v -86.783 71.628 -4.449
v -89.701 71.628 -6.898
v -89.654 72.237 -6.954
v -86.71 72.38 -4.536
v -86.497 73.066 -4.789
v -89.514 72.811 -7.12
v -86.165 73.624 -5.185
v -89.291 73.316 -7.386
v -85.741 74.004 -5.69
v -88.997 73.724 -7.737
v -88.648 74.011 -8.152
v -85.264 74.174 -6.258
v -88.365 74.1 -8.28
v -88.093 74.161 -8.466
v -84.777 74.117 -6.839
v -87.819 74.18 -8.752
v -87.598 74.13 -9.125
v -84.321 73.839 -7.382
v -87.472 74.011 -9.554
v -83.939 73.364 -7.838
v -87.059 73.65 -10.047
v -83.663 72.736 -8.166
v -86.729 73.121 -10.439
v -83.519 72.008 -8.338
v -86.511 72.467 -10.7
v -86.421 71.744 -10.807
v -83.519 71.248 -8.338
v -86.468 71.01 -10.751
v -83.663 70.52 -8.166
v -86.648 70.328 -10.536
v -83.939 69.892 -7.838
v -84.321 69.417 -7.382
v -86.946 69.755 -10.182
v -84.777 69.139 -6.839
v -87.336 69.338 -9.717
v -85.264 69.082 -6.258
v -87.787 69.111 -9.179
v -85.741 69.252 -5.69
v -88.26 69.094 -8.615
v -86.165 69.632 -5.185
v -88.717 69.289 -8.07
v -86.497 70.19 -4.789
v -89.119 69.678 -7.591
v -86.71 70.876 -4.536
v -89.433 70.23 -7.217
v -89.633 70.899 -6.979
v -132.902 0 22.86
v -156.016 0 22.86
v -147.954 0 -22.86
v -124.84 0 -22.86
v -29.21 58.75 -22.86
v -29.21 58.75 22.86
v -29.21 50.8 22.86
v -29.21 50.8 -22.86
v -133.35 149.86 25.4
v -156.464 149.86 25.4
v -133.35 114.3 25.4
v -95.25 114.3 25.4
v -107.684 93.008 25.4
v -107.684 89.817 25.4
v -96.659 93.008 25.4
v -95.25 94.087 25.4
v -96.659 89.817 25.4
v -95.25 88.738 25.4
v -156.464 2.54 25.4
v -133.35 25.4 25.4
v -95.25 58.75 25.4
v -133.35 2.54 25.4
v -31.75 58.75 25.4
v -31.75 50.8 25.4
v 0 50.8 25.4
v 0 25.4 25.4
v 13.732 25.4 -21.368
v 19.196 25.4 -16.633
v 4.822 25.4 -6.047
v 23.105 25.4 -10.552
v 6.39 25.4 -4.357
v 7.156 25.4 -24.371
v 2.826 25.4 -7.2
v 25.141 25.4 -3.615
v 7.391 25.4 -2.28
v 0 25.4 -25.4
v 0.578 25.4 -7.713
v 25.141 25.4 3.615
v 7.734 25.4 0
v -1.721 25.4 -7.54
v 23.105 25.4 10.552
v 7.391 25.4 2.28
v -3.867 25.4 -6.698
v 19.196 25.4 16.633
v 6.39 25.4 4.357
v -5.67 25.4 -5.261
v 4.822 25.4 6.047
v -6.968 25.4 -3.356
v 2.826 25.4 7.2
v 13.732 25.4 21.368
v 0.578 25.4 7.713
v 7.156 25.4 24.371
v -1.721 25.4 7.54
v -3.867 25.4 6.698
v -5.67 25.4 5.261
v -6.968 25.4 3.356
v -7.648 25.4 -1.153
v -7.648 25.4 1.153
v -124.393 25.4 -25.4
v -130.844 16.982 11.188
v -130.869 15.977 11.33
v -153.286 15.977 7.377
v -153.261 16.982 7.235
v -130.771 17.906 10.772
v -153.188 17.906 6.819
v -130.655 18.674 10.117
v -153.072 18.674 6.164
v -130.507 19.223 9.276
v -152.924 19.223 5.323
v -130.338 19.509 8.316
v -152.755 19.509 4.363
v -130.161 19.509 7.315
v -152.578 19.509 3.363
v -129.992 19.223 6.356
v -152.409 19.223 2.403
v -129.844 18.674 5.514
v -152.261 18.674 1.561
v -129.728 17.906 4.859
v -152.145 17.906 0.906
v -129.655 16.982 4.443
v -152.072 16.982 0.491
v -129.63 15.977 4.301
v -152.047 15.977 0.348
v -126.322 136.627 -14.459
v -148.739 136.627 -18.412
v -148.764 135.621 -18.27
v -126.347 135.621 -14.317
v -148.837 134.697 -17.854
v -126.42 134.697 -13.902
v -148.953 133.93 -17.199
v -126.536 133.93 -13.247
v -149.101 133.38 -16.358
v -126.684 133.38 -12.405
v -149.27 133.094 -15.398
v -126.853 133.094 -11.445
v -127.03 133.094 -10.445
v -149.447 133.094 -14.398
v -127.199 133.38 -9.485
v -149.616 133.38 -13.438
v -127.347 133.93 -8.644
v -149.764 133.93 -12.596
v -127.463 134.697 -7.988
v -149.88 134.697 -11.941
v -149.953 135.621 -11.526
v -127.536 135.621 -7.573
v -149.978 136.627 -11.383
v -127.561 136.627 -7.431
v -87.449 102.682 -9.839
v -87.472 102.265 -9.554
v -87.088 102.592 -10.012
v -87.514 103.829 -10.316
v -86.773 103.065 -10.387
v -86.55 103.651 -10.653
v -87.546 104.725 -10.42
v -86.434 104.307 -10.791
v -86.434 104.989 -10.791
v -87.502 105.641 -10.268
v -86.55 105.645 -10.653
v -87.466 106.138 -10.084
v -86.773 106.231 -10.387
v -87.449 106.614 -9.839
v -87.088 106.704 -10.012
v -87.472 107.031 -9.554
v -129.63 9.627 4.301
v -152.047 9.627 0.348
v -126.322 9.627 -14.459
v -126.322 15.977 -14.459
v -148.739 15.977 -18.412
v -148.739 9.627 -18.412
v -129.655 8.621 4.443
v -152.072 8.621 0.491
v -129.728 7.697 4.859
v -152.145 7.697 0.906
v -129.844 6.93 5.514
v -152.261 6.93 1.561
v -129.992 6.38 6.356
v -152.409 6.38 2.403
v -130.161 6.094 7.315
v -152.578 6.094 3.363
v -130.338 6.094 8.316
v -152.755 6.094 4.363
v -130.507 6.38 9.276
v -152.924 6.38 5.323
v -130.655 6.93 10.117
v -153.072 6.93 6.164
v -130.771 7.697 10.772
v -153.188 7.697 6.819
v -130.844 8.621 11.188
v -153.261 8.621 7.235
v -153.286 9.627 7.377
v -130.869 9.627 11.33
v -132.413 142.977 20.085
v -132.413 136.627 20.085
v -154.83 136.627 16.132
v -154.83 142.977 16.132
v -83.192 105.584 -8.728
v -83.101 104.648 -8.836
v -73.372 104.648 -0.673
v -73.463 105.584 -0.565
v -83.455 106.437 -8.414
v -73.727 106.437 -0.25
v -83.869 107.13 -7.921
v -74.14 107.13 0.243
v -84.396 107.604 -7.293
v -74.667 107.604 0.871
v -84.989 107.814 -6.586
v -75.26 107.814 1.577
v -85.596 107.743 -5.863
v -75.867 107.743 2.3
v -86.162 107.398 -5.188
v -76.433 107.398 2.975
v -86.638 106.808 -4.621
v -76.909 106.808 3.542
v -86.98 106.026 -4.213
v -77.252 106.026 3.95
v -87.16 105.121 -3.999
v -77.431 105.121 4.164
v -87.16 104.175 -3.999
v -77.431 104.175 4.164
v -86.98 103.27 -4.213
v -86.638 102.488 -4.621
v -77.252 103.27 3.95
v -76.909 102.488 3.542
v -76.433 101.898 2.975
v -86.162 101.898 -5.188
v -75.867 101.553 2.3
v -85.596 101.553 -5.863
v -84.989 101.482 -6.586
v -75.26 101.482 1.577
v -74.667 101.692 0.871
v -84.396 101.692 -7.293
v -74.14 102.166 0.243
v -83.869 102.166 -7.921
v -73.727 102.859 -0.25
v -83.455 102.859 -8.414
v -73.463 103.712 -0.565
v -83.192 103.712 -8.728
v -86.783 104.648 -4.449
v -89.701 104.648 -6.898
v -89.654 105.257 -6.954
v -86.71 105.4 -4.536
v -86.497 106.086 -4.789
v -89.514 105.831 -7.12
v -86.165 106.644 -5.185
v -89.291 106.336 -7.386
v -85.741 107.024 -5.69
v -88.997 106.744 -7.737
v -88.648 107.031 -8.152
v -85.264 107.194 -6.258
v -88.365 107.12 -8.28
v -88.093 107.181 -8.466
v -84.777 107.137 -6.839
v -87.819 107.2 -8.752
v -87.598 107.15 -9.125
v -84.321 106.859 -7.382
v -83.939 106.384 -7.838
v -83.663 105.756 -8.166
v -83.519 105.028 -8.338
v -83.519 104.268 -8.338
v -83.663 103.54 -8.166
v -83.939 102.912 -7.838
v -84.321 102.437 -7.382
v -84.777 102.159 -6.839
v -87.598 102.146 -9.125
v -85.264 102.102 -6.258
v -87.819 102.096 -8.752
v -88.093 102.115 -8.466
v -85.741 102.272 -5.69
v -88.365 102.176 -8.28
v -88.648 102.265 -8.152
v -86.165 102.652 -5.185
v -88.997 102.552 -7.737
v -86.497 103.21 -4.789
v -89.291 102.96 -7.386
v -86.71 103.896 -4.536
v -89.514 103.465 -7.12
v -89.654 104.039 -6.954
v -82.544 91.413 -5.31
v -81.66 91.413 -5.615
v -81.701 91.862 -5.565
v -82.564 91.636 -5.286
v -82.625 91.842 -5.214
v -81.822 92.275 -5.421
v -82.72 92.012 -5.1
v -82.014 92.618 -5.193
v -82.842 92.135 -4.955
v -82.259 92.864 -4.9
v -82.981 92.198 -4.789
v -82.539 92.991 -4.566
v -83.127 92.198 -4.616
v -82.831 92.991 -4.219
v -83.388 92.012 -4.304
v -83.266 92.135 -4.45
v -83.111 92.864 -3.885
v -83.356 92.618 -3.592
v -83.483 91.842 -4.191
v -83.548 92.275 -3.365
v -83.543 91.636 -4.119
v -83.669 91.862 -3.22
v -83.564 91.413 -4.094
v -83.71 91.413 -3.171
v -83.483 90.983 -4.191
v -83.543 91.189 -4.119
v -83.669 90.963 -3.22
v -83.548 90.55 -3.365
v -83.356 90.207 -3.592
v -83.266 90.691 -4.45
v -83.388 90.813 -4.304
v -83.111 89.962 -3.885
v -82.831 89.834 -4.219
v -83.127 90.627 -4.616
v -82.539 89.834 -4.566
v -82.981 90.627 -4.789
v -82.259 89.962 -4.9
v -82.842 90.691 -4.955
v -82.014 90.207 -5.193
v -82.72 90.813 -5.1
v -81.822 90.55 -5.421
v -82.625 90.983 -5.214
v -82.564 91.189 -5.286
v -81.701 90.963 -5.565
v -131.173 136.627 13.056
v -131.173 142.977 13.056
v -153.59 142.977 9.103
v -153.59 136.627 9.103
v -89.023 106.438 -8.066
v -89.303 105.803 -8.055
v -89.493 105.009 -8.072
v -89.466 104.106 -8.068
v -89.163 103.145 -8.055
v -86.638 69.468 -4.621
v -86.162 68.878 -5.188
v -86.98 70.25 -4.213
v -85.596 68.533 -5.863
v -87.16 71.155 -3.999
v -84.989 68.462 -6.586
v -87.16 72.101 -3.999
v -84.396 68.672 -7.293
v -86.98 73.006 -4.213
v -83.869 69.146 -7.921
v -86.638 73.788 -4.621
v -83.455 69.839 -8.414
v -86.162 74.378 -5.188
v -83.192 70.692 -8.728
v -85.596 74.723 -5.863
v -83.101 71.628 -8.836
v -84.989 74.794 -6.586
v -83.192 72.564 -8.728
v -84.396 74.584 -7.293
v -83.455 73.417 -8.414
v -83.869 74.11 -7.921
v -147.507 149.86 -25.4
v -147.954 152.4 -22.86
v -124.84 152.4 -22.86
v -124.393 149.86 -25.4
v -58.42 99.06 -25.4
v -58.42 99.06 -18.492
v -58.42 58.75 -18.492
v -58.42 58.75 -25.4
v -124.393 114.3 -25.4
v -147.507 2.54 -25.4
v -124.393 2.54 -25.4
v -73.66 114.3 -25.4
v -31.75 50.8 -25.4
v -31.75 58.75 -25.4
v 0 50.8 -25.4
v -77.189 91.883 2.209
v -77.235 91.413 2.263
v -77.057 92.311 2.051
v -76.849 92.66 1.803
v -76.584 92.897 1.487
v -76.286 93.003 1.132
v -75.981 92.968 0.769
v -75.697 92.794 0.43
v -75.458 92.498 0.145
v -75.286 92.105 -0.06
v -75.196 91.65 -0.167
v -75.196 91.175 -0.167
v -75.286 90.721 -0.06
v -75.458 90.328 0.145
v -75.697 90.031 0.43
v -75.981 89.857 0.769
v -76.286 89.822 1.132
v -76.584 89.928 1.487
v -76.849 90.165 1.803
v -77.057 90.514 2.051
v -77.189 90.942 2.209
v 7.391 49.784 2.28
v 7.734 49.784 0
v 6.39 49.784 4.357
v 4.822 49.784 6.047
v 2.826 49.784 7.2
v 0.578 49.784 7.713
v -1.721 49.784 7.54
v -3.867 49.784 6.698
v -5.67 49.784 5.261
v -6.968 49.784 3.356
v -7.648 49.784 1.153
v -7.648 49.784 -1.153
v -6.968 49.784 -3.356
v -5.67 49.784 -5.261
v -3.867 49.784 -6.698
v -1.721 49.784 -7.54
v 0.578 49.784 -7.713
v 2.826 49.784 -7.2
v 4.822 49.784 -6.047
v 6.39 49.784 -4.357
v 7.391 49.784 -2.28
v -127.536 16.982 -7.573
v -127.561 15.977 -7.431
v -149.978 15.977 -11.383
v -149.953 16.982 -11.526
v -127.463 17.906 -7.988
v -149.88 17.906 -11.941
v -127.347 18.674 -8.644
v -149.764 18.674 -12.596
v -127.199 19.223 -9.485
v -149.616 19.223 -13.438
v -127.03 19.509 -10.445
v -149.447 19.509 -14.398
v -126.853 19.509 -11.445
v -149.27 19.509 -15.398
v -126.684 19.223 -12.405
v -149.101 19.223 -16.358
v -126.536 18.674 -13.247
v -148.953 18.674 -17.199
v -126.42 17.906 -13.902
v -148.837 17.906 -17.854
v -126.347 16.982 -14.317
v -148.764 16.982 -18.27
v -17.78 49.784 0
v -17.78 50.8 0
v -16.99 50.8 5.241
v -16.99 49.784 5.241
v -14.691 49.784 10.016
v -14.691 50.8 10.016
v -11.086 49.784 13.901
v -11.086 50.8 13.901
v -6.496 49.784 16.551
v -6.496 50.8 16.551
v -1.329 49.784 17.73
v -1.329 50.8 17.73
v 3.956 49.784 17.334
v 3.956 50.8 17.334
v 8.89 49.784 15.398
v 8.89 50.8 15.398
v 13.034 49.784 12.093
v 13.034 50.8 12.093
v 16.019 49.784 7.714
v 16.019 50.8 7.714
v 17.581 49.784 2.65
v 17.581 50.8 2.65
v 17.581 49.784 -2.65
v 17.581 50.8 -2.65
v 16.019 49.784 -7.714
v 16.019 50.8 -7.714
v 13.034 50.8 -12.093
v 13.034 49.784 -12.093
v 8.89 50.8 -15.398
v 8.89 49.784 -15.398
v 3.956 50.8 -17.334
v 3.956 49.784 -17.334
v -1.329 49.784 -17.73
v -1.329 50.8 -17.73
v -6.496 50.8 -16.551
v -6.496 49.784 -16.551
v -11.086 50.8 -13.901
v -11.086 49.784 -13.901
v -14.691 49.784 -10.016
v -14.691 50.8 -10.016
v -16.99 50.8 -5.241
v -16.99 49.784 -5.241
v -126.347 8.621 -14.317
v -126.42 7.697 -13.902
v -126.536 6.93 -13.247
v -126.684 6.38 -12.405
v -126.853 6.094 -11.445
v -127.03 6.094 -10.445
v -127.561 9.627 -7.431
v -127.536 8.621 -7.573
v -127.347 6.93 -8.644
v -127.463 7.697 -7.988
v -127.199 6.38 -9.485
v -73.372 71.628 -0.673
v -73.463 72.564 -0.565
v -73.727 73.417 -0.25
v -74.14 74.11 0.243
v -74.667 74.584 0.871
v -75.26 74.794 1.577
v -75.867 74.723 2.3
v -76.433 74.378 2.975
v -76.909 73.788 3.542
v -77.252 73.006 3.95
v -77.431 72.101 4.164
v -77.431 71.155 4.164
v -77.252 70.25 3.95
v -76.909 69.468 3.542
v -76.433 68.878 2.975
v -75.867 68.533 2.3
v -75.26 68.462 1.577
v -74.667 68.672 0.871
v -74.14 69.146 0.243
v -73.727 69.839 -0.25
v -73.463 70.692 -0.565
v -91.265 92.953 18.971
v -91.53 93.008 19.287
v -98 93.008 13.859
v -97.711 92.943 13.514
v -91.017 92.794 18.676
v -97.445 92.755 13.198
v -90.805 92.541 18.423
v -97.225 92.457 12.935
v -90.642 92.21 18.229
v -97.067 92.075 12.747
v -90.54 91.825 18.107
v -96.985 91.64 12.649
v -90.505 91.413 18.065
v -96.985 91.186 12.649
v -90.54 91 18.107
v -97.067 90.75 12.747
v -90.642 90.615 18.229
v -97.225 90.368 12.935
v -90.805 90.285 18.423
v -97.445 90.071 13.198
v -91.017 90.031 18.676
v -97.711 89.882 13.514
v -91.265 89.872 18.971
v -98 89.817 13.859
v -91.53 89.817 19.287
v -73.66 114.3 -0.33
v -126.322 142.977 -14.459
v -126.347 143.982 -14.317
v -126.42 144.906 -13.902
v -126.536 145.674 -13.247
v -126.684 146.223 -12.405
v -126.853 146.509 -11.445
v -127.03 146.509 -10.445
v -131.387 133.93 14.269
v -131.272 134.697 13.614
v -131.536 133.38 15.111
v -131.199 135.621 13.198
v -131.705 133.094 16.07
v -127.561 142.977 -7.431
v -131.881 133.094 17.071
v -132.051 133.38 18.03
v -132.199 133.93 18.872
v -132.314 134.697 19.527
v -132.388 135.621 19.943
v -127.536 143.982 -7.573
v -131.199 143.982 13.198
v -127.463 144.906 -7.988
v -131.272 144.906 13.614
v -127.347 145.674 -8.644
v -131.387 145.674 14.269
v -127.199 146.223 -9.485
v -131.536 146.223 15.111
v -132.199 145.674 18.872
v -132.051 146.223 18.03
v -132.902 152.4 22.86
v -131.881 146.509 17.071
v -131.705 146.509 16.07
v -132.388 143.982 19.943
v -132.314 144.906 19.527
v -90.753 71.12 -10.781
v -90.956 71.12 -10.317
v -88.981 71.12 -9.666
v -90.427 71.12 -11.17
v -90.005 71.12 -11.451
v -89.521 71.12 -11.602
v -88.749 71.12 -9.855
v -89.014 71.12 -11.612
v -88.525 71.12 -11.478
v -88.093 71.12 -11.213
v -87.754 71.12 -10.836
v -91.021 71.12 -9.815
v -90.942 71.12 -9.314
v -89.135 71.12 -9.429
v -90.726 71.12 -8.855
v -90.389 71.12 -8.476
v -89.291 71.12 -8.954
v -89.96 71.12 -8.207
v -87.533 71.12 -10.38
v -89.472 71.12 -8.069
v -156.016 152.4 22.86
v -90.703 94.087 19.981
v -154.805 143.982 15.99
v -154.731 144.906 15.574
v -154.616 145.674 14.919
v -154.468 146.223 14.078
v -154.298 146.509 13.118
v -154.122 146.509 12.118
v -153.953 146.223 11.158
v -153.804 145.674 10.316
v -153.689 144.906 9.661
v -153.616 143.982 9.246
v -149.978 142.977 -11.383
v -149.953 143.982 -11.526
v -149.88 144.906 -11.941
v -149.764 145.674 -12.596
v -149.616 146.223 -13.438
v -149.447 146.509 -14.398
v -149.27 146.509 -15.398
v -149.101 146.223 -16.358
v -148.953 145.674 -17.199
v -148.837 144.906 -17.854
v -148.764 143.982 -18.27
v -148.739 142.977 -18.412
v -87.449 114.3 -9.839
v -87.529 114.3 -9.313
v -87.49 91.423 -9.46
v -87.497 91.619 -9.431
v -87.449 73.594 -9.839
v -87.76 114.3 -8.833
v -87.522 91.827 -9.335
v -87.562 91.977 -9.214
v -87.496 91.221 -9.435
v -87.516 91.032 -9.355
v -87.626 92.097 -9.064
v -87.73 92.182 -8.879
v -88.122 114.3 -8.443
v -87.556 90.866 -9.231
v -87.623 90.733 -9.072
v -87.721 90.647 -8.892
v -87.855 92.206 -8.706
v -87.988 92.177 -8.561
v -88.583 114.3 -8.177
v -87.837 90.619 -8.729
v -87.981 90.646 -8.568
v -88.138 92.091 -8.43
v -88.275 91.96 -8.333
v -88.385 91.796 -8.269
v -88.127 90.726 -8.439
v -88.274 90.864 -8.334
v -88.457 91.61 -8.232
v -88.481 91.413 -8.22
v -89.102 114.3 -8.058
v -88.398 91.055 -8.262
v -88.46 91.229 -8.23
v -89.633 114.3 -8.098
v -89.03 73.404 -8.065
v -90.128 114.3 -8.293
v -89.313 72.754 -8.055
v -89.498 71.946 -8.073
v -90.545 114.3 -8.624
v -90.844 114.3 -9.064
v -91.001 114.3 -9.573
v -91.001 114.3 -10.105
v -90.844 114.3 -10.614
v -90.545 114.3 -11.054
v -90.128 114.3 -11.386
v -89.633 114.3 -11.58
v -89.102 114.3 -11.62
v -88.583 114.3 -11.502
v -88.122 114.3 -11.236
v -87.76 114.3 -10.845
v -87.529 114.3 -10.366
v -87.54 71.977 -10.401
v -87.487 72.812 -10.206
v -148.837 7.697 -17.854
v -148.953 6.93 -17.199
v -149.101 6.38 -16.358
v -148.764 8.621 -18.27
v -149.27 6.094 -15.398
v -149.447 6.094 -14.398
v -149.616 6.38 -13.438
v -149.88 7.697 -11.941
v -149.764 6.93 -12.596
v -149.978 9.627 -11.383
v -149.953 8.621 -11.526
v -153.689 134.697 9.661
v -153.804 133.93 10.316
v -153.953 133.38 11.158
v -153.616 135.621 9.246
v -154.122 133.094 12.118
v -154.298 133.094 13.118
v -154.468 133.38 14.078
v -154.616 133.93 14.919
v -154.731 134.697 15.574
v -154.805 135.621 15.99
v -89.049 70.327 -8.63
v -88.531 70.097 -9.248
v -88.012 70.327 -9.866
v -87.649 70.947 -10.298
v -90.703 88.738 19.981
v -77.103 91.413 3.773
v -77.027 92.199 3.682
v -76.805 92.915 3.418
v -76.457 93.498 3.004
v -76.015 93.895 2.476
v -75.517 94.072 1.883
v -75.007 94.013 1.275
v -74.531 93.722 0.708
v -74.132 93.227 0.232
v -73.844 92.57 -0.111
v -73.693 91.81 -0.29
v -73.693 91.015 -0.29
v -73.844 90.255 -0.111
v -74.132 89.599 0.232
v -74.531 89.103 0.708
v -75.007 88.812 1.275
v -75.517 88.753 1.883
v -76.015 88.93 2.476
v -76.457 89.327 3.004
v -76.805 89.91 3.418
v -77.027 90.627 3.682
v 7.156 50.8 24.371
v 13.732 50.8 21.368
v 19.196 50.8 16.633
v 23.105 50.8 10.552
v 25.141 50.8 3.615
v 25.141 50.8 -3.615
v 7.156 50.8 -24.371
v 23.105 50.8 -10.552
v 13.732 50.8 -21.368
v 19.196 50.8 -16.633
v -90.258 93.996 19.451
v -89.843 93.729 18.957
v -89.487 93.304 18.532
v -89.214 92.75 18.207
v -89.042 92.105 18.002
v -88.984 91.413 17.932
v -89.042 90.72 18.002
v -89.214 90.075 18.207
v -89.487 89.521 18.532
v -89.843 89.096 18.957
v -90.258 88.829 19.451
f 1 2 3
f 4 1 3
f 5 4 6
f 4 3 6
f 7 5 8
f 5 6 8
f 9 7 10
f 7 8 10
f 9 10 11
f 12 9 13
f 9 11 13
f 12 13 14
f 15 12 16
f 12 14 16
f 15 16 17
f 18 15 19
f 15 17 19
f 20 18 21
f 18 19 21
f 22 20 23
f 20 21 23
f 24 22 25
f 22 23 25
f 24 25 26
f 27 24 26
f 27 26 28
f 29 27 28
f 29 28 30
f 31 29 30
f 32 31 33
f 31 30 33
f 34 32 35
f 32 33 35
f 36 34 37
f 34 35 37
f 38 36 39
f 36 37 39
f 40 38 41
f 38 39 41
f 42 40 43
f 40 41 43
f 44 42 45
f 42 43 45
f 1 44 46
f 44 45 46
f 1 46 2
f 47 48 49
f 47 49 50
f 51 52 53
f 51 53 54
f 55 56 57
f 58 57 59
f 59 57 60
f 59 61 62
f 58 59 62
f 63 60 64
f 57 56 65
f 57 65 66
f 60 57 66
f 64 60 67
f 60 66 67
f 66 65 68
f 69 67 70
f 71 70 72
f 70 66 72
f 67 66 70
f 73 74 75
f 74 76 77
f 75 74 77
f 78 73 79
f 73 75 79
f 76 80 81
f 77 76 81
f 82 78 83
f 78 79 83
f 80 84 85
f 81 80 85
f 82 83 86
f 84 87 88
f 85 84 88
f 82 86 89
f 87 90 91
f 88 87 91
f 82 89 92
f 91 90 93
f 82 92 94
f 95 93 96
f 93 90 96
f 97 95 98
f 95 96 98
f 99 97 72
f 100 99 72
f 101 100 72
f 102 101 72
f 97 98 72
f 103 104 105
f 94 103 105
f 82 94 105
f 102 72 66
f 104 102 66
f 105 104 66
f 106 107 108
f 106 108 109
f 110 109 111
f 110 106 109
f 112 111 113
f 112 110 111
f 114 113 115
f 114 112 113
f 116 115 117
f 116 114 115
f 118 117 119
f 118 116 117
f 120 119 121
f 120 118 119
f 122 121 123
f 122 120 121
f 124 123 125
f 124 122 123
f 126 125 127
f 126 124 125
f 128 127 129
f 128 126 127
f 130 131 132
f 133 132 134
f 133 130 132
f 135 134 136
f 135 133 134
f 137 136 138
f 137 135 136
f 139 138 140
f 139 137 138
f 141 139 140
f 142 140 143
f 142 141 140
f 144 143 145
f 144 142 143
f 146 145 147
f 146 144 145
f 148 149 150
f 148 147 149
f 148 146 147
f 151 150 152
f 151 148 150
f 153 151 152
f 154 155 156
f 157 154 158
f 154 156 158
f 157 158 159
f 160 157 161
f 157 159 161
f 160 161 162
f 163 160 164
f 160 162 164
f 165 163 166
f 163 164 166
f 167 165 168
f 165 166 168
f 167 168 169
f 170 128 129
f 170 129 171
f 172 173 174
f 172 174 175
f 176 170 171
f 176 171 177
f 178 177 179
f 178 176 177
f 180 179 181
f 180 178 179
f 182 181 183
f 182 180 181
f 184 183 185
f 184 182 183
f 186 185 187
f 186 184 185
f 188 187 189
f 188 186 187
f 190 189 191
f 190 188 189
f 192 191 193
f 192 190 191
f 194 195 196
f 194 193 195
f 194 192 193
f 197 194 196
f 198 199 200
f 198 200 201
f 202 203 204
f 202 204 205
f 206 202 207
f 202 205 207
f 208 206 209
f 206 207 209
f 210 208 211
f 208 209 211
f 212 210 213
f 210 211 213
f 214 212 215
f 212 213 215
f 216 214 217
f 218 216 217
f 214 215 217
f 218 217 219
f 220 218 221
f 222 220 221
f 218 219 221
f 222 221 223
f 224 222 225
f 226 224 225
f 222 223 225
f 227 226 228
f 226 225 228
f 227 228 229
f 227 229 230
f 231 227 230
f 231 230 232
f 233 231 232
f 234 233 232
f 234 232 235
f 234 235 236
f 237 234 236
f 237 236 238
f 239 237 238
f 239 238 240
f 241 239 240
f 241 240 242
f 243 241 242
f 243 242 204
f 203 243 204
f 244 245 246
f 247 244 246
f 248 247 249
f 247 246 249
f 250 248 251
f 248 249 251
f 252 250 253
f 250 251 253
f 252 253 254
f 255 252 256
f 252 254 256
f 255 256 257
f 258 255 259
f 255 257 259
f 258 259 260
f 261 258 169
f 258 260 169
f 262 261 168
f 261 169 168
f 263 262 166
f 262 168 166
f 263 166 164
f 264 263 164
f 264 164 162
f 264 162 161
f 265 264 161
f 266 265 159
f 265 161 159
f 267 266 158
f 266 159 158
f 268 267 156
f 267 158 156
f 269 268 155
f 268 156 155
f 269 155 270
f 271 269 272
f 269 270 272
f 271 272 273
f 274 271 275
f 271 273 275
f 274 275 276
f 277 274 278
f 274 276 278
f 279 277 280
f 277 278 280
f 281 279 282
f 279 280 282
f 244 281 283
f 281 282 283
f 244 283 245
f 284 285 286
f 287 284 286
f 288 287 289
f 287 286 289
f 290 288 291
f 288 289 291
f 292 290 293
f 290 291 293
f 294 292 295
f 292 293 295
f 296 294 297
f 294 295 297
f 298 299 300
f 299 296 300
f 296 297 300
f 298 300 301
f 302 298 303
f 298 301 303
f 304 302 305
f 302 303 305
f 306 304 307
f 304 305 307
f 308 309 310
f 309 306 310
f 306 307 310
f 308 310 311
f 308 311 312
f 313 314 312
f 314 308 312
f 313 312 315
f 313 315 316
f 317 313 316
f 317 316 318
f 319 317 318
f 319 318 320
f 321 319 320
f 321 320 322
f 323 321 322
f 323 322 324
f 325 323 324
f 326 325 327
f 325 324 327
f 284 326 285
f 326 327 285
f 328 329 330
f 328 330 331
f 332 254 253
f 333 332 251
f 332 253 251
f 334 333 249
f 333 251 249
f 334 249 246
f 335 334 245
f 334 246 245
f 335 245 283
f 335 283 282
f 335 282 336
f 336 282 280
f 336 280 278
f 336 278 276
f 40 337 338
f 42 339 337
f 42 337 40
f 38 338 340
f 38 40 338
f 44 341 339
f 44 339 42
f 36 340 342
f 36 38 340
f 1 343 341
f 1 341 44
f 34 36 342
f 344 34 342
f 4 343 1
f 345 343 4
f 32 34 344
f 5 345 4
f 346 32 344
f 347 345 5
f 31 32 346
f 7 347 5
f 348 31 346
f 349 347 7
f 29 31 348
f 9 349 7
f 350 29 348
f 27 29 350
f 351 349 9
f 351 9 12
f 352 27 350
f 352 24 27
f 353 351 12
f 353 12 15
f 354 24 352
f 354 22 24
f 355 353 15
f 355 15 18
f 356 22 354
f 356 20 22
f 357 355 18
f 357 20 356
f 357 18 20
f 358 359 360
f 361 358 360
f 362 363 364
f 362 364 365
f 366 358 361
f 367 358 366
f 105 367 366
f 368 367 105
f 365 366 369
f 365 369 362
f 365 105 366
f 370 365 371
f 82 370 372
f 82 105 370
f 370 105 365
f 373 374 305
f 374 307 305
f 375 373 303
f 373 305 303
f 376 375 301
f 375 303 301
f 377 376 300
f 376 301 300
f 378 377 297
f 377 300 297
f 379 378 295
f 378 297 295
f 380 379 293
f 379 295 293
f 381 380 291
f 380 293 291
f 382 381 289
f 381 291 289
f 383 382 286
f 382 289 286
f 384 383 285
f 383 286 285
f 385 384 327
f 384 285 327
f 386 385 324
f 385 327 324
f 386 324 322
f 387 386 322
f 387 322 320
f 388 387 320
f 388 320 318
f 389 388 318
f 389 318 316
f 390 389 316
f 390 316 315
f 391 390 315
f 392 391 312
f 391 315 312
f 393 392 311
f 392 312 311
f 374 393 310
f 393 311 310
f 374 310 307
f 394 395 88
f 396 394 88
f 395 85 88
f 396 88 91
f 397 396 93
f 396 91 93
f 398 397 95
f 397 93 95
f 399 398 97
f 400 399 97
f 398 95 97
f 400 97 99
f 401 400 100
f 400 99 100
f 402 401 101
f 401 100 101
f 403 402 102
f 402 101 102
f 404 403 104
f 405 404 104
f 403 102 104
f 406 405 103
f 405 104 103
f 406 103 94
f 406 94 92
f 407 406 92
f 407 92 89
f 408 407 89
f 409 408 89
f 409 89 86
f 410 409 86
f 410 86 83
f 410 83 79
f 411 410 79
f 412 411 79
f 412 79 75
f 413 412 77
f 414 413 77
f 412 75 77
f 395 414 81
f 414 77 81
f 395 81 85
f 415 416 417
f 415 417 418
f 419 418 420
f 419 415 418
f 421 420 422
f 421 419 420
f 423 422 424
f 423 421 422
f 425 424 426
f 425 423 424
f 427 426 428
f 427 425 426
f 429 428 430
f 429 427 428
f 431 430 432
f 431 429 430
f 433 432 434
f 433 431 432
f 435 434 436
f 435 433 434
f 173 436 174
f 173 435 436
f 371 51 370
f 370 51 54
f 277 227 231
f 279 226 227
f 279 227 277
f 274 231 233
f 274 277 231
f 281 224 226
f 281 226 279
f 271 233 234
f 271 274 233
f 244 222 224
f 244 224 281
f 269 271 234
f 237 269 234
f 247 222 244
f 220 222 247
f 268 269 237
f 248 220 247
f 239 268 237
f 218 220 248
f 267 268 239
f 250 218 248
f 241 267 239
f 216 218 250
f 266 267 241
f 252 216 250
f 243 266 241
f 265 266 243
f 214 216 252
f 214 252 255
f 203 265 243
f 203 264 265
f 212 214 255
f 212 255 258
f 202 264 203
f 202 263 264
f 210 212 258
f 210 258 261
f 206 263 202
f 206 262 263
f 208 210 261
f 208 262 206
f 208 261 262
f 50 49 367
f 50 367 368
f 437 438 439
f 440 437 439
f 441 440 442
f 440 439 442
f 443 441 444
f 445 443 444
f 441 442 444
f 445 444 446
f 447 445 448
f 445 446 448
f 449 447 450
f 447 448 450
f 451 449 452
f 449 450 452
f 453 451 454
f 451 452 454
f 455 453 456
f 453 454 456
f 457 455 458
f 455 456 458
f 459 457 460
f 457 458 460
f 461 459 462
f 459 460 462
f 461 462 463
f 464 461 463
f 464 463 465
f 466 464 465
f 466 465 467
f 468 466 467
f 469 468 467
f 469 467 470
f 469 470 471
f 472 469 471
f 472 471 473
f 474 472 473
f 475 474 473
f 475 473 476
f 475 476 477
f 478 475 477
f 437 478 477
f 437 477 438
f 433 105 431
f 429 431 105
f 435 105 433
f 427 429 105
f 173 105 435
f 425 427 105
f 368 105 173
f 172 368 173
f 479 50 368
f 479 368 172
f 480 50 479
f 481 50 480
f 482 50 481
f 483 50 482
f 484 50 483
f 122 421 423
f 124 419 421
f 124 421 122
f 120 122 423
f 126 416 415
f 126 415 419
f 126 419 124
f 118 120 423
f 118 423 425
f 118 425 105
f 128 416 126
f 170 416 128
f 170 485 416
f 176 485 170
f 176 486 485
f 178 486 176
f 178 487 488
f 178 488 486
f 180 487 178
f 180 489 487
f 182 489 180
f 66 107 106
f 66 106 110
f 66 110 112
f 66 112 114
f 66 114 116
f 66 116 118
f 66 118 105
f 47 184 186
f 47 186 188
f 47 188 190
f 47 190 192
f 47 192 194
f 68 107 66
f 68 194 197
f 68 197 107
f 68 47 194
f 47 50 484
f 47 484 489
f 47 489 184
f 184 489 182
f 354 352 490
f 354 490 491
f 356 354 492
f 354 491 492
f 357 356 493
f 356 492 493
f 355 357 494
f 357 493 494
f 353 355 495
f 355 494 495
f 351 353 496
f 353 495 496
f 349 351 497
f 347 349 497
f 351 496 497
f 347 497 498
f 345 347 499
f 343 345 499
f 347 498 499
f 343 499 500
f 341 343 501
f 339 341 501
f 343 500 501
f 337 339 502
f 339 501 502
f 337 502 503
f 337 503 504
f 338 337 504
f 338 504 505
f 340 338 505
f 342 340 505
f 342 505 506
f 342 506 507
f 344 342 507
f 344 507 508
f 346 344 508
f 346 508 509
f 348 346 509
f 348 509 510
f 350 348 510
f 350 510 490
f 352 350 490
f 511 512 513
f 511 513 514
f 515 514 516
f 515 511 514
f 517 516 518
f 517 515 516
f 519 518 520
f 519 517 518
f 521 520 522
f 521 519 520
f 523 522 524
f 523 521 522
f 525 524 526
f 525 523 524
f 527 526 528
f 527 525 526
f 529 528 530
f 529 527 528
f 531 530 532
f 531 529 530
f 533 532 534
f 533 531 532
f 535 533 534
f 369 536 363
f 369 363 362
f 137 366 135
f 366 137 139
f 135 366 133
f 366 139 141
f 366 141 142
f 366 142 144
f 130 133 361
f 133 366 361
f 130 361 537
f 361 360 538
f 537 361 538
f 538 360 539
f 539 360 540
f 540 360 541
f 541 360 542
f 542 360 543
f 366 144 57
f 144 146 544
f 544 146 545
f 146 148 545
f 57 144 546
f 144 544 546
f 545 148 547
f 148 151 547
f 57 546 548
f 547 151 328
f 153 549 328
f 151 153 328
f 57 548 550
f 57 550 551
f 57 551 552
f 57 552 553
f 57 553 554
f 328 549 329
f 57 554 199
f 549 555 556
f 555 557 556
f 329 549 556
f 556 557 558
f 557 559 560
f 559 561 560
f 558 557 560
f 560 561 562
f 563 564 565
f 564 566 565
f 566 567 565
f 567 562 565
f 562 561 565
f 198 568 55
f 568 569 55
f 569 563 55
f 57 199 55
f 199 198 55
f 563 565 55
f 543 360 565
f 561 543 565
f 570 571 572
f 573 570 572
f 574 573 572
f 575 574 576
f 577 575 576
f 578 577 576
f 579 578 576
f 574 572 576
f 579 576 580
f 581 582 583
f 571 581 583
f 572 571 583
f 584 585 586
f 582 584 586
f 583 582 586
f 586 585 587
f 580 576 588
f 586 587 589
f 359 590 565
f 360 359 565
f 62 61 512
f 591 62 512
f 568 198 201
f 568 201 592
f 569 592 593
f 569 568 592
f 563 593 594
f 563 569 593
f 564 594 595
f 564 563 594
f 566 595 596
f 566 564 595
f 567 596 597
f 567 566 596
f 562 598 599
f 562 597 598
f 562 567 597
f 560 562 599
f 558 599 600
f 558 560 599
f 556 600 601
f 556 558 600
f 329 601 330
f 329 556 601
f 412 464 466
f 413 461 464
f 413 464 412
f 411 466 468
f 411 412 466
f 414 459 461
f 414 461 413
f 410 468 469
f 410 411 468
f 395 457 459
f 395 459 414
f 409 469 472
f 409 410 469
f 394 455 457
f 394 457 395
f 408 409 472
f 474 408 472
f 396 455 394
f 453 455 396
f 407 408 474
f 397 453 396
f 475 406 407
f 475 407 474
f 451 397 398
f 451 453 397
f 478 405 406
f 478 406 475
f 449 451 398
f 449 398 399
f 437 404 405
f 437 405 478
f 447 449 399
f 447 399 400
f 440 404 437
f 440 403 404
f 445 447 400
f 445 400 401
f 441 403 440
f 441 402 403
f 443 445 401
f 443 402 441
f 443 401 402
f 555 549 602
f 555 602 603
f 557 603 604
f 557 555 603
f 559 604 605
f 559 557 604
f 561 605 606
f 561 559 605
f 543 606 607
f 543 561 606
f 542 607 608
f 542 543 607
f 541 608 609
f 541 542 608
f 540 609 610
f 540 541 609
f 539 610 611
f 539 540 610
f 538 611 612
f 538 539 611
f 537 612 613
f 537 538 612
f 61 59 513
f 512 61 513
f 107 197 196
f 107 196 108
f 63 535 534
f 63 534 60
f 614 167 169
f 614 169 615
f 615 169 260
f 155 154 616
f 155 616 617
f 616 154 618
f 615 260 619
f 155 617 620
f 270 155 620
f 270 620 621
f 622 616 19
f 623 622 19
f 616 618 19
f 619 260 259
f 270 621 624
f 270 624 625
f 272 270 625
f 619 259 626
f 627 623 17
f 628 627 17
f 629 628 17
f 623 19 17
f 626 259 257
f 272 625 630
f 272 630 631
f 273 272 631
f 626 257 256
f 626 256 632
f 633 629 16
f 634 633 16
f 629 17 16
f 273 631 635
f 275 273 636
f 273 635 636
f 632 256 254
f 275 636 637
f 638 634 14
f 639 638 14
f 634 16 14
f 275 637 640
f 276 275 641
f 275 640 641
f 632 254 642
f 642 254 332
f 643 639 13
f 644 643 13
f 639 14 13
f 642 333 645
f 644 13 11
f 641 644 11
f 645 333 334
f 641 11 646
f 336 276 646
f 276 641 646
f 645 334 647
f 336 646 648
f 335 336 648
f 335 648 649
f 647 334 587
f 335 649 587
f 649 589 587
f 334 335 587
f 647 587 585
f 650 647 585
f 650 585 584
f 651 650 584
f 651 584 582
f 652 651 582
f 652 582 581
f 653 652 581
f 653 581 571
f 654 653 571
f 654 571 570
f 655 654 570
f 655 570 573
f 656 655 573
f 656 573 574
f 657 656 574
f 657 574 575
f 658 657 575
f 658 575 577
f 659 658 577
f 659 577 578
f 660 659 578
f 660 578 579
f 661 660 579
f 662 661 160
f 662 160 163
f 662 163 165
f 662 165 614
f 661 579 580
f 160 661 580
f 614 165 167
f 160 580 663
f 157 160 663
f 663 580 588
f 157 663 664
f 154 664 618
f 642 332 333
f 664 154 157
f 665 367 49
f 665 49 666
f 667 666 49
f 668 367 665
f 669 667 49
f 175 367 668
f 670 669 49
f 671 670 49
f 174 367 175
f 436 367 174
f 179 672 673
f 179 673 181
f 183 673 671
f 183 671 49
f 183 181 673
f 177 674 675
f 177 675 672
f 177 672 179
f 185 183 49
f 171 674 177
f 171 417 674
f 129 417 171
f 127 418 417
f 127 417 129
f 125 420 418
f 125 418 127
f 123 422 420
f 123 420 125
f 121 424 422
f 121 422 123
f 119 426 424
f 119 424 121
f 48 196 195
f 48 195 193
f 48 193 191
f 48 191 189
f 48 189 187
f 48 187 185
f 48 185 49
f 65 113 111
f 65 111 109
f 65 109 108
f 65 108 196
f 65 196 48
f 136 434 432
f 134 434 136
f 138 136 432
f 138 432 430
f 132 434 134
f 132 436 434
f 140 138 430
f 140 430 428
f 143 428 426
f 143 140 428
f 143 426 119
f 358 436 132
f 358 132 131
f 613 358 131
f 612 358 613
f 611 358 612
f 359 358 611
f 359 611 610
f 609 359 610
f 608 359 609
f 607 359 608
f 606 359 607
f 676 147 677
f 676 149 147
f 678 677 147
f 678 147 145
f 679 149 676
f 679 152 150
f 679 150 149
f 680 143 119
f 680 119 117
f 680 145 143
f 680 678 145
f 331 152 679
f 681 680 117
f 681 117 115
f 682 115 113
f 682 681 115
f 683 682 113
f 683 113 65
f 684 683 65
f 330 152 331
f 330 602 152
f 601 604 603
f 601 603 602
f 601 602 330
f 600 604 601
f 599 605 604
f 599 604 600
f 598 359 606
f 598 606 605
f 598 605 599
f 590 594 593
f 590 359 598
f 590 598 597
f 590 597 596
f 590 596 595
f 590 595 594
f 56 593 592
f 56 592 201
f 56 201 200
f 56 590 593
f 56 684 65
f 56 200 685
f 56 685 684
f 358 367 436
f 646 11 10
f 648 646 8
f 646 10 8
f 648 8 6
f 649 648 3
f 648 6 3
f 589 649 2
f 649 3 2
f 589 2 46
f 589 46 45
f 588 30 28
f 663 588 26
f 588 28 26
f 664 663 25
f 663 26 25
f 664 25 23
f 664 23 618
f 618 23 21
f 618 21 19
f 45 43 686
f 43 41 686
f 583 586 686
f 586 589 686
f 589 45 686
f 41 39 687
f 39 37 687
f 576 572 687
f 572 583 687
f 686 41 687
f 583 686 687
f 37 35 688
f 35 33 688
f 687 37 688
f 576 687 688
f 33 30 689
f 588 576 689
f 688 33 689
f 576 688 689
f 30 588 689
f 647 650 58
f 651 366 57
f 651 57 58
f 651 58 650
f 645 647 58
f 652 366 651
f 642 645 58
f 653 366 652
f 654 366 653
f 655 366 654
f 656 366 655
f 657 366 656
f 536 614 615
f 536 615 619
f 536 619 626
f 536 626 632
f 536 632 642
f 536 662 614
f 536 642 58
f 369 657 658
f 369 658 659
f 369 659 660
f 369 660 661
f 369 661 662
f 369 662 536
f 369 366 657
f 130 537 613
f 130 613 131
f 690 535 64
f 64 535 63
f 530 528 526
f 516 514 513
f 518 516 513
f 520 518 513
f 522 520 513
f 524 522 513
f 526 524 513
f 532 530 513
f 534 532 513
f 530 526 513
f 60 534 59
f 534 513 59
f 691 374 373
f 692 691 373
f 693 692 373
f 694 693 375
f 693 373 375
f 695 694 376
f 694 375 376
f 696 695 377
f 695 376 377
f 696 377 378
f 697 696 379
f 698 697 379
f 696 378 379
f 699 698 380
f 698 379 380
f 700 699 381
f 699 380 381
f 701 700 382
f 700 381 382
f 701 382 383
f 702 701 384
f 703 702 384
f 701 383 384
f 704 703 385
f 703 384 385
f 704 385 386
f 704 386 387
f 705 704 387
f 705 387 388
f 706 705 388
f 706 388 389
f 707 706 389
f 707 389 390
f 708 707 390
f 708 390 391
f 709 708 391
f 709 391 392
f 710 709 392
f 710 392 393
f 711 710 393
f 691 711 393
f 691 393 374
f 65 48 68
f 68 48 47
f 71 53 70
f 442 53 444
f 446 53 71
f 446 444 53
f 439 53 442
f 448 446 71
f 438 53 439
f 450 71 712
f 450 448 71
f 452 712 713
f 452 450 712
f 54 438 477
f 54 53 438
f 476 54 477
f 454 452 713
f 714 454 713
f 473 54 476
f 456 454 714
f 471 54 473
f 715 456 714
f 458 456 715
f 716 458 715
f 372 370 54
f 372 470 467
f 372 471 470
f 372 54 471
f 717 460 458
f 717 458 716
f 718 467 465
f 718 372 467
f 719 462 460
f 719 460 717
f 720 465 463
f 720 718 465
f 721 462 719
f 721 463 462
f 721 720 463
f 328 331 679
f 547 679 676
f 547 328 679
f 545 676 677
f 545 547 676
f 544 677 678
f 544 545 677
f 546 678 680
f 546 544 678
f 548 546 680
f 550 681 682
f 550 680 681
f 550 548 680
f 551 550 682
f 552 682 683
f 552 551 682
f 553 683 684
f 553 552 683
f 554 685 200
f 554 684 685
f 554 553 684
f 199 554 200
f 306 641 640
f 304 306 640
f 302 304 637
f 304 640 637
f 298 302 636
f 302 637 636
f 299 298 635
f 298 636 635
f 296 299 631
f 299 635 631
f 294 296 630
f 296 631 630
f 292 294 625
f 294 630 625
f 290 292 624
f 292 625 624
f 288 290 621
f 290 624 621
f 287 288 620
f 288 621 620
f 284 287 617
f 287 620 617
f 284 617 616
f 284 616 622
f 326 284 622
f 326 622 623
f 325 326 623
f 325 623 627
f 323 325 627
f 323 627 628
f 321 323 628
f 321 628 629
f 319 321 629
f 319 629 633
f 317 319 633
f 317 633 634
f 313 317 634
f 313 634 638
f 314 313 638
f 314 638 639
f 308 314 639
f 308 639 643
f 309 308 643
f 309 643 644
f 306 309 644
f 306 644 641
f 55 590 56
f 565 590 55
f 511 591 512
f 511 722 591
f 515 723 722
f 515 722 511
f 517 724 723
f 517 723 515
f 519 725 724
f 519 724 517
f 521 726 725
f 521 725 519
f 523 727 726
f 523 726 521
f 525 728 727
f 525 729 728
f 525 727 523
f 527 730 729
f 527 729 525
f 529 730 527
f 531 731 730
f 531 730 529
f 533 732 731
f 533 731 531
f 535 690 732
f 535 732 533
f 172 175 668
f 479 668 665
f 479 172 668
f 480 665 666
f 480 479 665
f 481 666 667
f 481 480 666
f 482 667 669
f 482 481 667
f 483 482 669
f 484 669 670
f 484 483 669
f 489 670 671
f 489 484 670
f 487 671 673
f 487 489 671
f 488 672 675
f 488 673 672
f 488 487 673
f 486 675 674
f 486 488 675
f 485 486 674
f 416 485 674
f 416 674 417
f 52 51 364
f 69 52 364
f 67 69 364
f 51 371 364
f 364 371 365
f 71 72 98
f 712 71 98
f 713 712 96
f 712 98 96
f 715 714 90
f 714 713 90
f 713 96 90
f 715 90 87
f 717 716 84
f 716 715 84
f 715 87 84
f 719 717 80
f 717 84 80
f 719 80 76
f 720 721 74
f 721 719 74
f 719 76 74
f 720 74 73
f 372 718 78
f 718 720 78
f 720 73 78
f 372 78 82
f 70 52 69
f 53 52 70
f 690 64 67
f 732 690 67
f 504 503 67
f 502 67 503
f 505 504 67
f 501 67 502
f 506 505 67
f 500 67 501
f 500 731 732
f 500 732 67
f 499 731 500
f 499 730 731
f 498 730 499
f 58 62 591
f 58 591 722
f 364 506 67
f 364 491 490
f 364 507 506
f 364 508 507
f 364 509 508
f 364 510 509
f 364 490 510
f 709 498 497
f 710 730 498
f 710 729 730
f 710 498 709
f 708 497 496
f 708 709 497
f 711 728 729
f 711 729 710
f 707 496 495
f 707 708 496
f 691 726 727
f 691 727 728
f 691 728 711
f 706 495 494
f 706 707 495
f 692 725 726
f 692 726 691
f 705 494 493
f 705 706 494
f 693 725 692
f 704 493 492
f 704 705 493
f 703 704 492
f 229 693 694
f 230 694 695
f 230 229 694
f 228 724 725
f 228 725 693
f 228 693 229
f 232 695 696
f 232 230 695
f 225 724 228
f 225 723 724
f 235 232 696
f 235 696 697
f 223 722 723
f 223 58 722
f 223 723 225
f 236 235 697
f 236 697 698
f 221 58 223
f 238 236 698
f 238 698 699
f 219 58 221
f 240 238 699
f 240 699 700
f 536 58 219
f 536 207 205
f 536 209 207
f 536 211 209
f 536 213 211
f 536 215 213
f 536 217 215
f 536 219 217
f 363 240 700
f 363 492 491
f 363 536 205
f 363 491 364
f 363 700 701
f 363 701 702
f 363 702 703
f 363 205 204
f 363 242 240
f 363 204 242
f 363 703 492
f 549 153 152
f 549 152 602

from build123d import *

# Parameters (mm, degrees)
SKETCH1_W                              = 181.864
SKETCH1_H                              = 50.8
EXTRUDE1_DEPTH                         = 152.4
EXTRUDE2_DEPTH                         = 153.4
EXTRUDE3_DEPTH                         = 38.1
EXTRUDE4_DEPTH                         = 55.5498
SKETCH5_W                              = 54.61
SKETCH5_H                              = 50.8
EXTRUDE5_DEPTH                         = 7.9502
EXTRUDE6_DEPTH                         = 25.4
EXTRUDE7_DEPTH                         = 32.584173829
LPATTERN1_COUNT                        = 2
LPATTERN1_PITCH                        = 127
LPATTERN1_COUNT_DIR2                   = 2
LPATTERN1_PITCH_DIR2                   = 27.94
F_1_4_20_TAPPED_HOLE1_D                = 5.1054
F_1_4_20_TAPPED_HOLE1_DEPTH            = 16.51
F_1_4_20_TAPPED_HOLE1_CBORE_D          = 6.35
F_1_4_20_TAPPED_HOLE1_CBORE_DEPTH      = 12.7
F_1_4_20_TAPPED_HOLE1_TIP              = 1.533816902
EXTRUDE9_DEPTH                         = 128
CHAMFER1_SIZE                          = 2.54
CHAMFER2_SIZE                          = 15.24
EXTRUDE10_DEPTH                        = 32.584173829
SCREW_THRU_HOLE_AND_CBORE_D            = 15.4686
SCREW_THRU_HOLE_AND_CBORE_CBORE_D      = 35.56
SCREW_THRU_HOLE_AND_CBORE_CBORE_DEPTH  = 1.016
F_1_8_0_125_DIAMETER_HOLE1_D           = 3.19024
F_1_8_0_125_DIAMETER_HOLE1_DEPTH       = 9.525
F_1_8_0_125_DIAMETER_HOLE1_CSINK_D     = 5.334
F_1_8_0_125_DIAMETER_HOLE1_CSINK_ANGLE = 90
F_1_8_0_125_DIAMETER_HOLE1_TIP         = 0.958444791
CUT_EXTRUDE1_DEPTH                     = 9.525
CHAMFER3_SIZE                          = 1.0795
F_9_64_0_14063_DIAMETER_HOLE1_D        = 3.572002
F_9_64_0_14063_DIAMETER_HOLE1_DEPTH    = 43.18
F_1_16_0_0625_DIAMETER_HOLE1_D         = 1.5875
F_1_16_0_0625_DIAMETER_HOLE1_DEPTH     = 16.51


with BuildPart() as part:
    # Sketch1 → Extrude1 (new body)
    with BuildSketch(Plane(origin=(0, 0, 0), x_dir=(1, 0, 0), z_dir=(0, 1, 0))):
        with Locations((-65.532, 0)):
            Rectangle(SKETCH1_W, SKETCH1_H)
    extrude(amount=EXTRUDE1_DEPTH)

    # Sketch2 → Extrude2 (cut, through all)
    with BuildSketch(Plane(origin=(0, 152.4, 0), x_dir=(1, 0, 0), z_dir=(0, 1, 0))):
        Polygon((-156.464, -25.4), (-156.464, 25.4), (-147.50658938, 25.4), align=None)
    extrude(amount=-EXTRUDE2_DEPTH, mode=Mode.SUBTRACT)

    # Sketch3 → Extrude3 (cut)
    with BuildSketch(Plane(origin=(0, 152.4, 0), x_dir=(1, 0, 0), z_dir=(0, 1, 0))):
        Polygon((25.4, -25.4), (25.4, 25.4), (-124.39258938, 25.4), (-133.35, -25.4), align=None)
    extrude(amount=-EXTRUDE3_DEPTH, mode=Mode.SUBTRACT)

    # Sketch4 → Extrude4 (cut)
    with BuildSketch(Plane(origin=(0, 114.3, 0), x_dir=(1, 0, 0), z_dir=(0, 1, 0))):
        Polygon((25.4, -25.4), (-95.25, -25.4), (-58.42, 18.492284815), (-58.42, 25.4), (25.4, 25.4), align=None)
    extrude(amount=-EXTRUDE4_DEPTH, mode=Mode.SUBTRACT)

    # Sketch5 → Extrude5 (cut)
    with BuildSketch(Plane(origin=(0, 58.7502, 0), x_dir=(1, 0, 0), z_dir=(0, 1, 0))):
        with Locations((-1.905, 0)):
            Rectangle(SKETCH5_W, SKETCH5_H)
    extrude(amount=-EXTRUDE5_DEPTH, mode=Mode.SUBTRACT)

    # Sketch6 → Extrude6 (cut)
    with BuildSketch(Plane.XZ):
        Polygon((25.4, 25.4), (25.4, -25.4), (-124.39258938, -25.4), (-133.35, 25.4), align=None)
    extrude(amount=-EXTRUDE6_DEPTH, mode=Mode.SUBTRACT)

    # Sketch7 → Extrude7 (cut, through all)
    with BuildSketch(Plane(origin=(-124.985349671, 0, -22.03828934), x_dir=(0.173648178, 0, -0.984807753), z_dir=(0.984807753, 0, 0.173648178))):
        with BuildLine():
            Line((-35.635705397, 142.9766), (-35.635705397, 136.6266))
            ThreePointArc((-35.635705397, 136.6266), (-39.204405397, 133.0579), (-42.773105397, 136.6266))
            Line((-42.773105397, 136.6266), (-42.773105397, 142.9766))
            ThreePointArc((-42.773105397, 142.9766), (-39.204405397, 146.5453), (-35.635705397, 142.9766))
        make_face()
    extrude7 = extrude(amount=-EXTRUDE7_DEPTH, mode=Mode.SUBTRACT)

    # LPattern1: Extrude7 2 × 2, 1 skipped
    with Locations(*[Vector(0, -1, 0) * (i * LPATTERN1_PITCH) + Vector(0.173648178, 0, -0.984807753) * (j * LPATTERN1_PITCH_DIR2) for i in range(LPATTERN1_COUNT) for j in range(LPATTERN1_COUNT_DIR2) if (i, j) not in ((0, 0), (1, 0))]):
        add(extrude7, mode=Mode.SUBTRACT)

    # 1/4-20 Tapped Hole1
    with Locations(Plane(origin=(-43.387935998, 0, -36.406801094), x_dir=(0.64278761, 0, -0.766044443), z_dir=(0.766044443, 0, 0.64278761))):
        with Locations((-49.822048678, 104.648), (-49.822048678, 71.628)):
            CounterBoreHole(F_1_4_20_TAPPED_HOLE1_D / 2, F_1_4_20_TAPPED_HOLE1_CBORE_D / 2, F_1_4_20_TAPPED_HOLE1_CBORE_DEPTH, depth=F_1_4_20_TAPPED_HOLE1_DEPTH)
            with Locations((0, 0, -(F_1_4_20_TAPPED_HOLE1_DEPTH + F_1_4_20_TAPPED_HOLE1_TIP / 2))):  # 118° drill point
                Cone(0, F_1_4_20_TAPPED_HOLE1_D / 2, F_1_4_20_TAPPED_HOLE1_TIP, mode=Mode.SUBTRACT)

    # Sketch19 → Extrude9 (cut, through all)
    with BuildSketch(Plane.XZ.offset(-25.4)):
        with BuildLine():
            Line((27.94, 25.4), (0, 25.4))
            ThreePointArc((0, 25.4), (25.4, 0), (0, -25.4))
            Line((0, -25.4), (27.94, -25.4))
            Line((27.94, -25.4), (27.94, 25.4))
        make_face()
    extrude(amount=-EXTRUDE9_DEPTH, mode=Mode.SUBTRACT)

    # Chamfer1
    chamfer1_edges = [part.edges().sort_by_distance(p)[0] for p in [
        (-135.94958938, 152.4, -25.4),
        (-144.907, 0, 25.4),
        (-29.21, 54.7751, 25.4),
        (-29.21, 54.7751, -25.4),
        (-135.94958938, 0, -25.4),
        (-144.907, 152.4, 25.4),
    ]]
    chamfer(chamfer1_edges, length=CHAMFER1_SIZE)

    # Chamfer2
    chamfer2_edges = [part.edges().sort_by_distance(p)[0] for p in [
        (-58.42, 114.3, -21.946142408),
    ]]
    chamfer(chamfer2_edges, length=CHAMFER2_SIZE)

    # Sketch20 → Extrude10 (cut, through all)
    with BuildSketch(Plane(origin=(-124.985349671, 0, -22.03828934), x_dir=(0.173648178, 0, -0.984807753), z_dir=(0.984807753, 0, 0.173648178))):
        with BuildLine():
            Line((-26.745705397, 15.9766), (-26.745705397, 9.6266))
            ThreePointArc((-26.745705397, 9.6266), (-30.314405397, 6.0579), (-33.883105397, 9.6266))
            Line((-33.883105397, 9.6266), (-33.883105397, 15.9766))
            ThreePointArc((-33.883105397, 15.9766), (-30.314405397, 19.5453), (-26.745705397, 15.9766))
        make_face()
    extrude(amount=-EXTRUDE10_DEPTH, mode=Mode.SUBTRACT)

    # SCREW THRU HOLE AND CBORE (through all)
    with Locations(Plane(origin=(0, 50.8, 0), x_dir=(-1, 0, 0), z_dir=(0, 1, 0))):
        with Locations((0, 0)):
            CounterBoreHole(SCREW_THRU_HOLE_AND_CBORE_D / 2, SCREW_THRU_HOLE_AND_CBORE_CBORE_D / 2, SCREW_THRU_HOLE_AND_CBORE_CBORE_DEPTH)

    # 1/8 (0.125) Diameter Hole1
    with Locations(Plane(origin=(-43.387935998, 0, -36.406801094), x_dir=(0.64278761, 0, -0.766044443), z_dir=(0.766044443, 0, 0.64278761))):
        with Locations((-49.784, 91.412613047)):
            CounterSinkHole(F_1_8_0_125_DIAMETER_HOLE1_D / 2, F_1_8_0_125_DIAMETER_HOLE1_CSINK_D / 2, depth=F_1_8_0_125_DIAMETER_HOLE1_DEPTH, counter_sink_angle=F_1_8_0_125_DIAMETER_HOLE1_CSINK_ANGLE)
            with Locations((0, 0, -(F_1_8_0_125_DIAMETER_HOLE1_DEPTH + F_1_8_0_125_DIAMETER_HOLE1_TIP / 2))):  # 118° drill point
                Cone(0, F_1_8_0_125_DIAMETER_HOLE1_D / 2, F_1_8_0_125_DIAMETER_HOLE1_TIP, mode=Mode.SUBTRACT)

    # Sketch26 → Cut-Extrude1 (cut)
    with BuildSketch(Plane(origin=(-43.387935998, 0, -36.406801094), x_dir=(0.64278761, 0, -0.766044443), z_dir=(0.766044443, 0, 0.64278761))):
        with BuildLine():
            Line((-73.6092, 89.817493047), (-92.6592, 89.817493047))
            ThreePointArc((-92.6592, 89.817493047), (-94.25432, 91.412613047), (-92.6592, 93.007733047))
            Line((-92.6592, 93.007733047), (-73.6092, 93.007733047))
            ThreePointArc((-73.6092, 93.007733047), (-72.01408, 91.412613047), (-73.6092, 89.817493047))
        make_face()
    extrude(amount=-CUT_EXTRUDE1_DEPTH, mode=Mode.SUBTRACT)

    # Chamfer3
    chamfer3_edges = [part.edges().sort_by_distance(p)[0] for p in [
        (-92.976508859, 89.817493047, 22.690558764),
        (-92.976508859, 93.007733047, 22.690558764),
        (-89.677694345, 91.412613047, 18.759184717),
    ]]
    chamfer(chamfer3_edges, length=CHAMFER3_SIZE)

    # 9/64 (0.14063) Diameter Hole1
    with Locations(Plane(origin=(0, 114.3, 0), x_dir=(-1, 0, 0), z_dir=(0, 1, 0))):
        with Locations((89.235297248, -9.839239495)):
            Hole(F_9_64_0_14063_DIAMETER_HOLE1_D / 2, depth=F_9_64_0_14063_DIAMETER_HOLE1_DEPTH)

    # 1/16 (0.0625) Diameter Hole1
    with Locations(Plane(origin=(-43.387935998, 0, -36.406801094), x_dir=(0.64278761, 0, -0.766044443), z_dir=(0.766044443, 0, 0.64278761))):
        with Locations((-49.784, 91.412613047)):
            Hole(F_1_16_0_0625_DIAMETER_HOLE1_D / 2, depth=F_1_16_0_0625_DIAMETER_HOLE1_DEPTH)


solid = part.part
